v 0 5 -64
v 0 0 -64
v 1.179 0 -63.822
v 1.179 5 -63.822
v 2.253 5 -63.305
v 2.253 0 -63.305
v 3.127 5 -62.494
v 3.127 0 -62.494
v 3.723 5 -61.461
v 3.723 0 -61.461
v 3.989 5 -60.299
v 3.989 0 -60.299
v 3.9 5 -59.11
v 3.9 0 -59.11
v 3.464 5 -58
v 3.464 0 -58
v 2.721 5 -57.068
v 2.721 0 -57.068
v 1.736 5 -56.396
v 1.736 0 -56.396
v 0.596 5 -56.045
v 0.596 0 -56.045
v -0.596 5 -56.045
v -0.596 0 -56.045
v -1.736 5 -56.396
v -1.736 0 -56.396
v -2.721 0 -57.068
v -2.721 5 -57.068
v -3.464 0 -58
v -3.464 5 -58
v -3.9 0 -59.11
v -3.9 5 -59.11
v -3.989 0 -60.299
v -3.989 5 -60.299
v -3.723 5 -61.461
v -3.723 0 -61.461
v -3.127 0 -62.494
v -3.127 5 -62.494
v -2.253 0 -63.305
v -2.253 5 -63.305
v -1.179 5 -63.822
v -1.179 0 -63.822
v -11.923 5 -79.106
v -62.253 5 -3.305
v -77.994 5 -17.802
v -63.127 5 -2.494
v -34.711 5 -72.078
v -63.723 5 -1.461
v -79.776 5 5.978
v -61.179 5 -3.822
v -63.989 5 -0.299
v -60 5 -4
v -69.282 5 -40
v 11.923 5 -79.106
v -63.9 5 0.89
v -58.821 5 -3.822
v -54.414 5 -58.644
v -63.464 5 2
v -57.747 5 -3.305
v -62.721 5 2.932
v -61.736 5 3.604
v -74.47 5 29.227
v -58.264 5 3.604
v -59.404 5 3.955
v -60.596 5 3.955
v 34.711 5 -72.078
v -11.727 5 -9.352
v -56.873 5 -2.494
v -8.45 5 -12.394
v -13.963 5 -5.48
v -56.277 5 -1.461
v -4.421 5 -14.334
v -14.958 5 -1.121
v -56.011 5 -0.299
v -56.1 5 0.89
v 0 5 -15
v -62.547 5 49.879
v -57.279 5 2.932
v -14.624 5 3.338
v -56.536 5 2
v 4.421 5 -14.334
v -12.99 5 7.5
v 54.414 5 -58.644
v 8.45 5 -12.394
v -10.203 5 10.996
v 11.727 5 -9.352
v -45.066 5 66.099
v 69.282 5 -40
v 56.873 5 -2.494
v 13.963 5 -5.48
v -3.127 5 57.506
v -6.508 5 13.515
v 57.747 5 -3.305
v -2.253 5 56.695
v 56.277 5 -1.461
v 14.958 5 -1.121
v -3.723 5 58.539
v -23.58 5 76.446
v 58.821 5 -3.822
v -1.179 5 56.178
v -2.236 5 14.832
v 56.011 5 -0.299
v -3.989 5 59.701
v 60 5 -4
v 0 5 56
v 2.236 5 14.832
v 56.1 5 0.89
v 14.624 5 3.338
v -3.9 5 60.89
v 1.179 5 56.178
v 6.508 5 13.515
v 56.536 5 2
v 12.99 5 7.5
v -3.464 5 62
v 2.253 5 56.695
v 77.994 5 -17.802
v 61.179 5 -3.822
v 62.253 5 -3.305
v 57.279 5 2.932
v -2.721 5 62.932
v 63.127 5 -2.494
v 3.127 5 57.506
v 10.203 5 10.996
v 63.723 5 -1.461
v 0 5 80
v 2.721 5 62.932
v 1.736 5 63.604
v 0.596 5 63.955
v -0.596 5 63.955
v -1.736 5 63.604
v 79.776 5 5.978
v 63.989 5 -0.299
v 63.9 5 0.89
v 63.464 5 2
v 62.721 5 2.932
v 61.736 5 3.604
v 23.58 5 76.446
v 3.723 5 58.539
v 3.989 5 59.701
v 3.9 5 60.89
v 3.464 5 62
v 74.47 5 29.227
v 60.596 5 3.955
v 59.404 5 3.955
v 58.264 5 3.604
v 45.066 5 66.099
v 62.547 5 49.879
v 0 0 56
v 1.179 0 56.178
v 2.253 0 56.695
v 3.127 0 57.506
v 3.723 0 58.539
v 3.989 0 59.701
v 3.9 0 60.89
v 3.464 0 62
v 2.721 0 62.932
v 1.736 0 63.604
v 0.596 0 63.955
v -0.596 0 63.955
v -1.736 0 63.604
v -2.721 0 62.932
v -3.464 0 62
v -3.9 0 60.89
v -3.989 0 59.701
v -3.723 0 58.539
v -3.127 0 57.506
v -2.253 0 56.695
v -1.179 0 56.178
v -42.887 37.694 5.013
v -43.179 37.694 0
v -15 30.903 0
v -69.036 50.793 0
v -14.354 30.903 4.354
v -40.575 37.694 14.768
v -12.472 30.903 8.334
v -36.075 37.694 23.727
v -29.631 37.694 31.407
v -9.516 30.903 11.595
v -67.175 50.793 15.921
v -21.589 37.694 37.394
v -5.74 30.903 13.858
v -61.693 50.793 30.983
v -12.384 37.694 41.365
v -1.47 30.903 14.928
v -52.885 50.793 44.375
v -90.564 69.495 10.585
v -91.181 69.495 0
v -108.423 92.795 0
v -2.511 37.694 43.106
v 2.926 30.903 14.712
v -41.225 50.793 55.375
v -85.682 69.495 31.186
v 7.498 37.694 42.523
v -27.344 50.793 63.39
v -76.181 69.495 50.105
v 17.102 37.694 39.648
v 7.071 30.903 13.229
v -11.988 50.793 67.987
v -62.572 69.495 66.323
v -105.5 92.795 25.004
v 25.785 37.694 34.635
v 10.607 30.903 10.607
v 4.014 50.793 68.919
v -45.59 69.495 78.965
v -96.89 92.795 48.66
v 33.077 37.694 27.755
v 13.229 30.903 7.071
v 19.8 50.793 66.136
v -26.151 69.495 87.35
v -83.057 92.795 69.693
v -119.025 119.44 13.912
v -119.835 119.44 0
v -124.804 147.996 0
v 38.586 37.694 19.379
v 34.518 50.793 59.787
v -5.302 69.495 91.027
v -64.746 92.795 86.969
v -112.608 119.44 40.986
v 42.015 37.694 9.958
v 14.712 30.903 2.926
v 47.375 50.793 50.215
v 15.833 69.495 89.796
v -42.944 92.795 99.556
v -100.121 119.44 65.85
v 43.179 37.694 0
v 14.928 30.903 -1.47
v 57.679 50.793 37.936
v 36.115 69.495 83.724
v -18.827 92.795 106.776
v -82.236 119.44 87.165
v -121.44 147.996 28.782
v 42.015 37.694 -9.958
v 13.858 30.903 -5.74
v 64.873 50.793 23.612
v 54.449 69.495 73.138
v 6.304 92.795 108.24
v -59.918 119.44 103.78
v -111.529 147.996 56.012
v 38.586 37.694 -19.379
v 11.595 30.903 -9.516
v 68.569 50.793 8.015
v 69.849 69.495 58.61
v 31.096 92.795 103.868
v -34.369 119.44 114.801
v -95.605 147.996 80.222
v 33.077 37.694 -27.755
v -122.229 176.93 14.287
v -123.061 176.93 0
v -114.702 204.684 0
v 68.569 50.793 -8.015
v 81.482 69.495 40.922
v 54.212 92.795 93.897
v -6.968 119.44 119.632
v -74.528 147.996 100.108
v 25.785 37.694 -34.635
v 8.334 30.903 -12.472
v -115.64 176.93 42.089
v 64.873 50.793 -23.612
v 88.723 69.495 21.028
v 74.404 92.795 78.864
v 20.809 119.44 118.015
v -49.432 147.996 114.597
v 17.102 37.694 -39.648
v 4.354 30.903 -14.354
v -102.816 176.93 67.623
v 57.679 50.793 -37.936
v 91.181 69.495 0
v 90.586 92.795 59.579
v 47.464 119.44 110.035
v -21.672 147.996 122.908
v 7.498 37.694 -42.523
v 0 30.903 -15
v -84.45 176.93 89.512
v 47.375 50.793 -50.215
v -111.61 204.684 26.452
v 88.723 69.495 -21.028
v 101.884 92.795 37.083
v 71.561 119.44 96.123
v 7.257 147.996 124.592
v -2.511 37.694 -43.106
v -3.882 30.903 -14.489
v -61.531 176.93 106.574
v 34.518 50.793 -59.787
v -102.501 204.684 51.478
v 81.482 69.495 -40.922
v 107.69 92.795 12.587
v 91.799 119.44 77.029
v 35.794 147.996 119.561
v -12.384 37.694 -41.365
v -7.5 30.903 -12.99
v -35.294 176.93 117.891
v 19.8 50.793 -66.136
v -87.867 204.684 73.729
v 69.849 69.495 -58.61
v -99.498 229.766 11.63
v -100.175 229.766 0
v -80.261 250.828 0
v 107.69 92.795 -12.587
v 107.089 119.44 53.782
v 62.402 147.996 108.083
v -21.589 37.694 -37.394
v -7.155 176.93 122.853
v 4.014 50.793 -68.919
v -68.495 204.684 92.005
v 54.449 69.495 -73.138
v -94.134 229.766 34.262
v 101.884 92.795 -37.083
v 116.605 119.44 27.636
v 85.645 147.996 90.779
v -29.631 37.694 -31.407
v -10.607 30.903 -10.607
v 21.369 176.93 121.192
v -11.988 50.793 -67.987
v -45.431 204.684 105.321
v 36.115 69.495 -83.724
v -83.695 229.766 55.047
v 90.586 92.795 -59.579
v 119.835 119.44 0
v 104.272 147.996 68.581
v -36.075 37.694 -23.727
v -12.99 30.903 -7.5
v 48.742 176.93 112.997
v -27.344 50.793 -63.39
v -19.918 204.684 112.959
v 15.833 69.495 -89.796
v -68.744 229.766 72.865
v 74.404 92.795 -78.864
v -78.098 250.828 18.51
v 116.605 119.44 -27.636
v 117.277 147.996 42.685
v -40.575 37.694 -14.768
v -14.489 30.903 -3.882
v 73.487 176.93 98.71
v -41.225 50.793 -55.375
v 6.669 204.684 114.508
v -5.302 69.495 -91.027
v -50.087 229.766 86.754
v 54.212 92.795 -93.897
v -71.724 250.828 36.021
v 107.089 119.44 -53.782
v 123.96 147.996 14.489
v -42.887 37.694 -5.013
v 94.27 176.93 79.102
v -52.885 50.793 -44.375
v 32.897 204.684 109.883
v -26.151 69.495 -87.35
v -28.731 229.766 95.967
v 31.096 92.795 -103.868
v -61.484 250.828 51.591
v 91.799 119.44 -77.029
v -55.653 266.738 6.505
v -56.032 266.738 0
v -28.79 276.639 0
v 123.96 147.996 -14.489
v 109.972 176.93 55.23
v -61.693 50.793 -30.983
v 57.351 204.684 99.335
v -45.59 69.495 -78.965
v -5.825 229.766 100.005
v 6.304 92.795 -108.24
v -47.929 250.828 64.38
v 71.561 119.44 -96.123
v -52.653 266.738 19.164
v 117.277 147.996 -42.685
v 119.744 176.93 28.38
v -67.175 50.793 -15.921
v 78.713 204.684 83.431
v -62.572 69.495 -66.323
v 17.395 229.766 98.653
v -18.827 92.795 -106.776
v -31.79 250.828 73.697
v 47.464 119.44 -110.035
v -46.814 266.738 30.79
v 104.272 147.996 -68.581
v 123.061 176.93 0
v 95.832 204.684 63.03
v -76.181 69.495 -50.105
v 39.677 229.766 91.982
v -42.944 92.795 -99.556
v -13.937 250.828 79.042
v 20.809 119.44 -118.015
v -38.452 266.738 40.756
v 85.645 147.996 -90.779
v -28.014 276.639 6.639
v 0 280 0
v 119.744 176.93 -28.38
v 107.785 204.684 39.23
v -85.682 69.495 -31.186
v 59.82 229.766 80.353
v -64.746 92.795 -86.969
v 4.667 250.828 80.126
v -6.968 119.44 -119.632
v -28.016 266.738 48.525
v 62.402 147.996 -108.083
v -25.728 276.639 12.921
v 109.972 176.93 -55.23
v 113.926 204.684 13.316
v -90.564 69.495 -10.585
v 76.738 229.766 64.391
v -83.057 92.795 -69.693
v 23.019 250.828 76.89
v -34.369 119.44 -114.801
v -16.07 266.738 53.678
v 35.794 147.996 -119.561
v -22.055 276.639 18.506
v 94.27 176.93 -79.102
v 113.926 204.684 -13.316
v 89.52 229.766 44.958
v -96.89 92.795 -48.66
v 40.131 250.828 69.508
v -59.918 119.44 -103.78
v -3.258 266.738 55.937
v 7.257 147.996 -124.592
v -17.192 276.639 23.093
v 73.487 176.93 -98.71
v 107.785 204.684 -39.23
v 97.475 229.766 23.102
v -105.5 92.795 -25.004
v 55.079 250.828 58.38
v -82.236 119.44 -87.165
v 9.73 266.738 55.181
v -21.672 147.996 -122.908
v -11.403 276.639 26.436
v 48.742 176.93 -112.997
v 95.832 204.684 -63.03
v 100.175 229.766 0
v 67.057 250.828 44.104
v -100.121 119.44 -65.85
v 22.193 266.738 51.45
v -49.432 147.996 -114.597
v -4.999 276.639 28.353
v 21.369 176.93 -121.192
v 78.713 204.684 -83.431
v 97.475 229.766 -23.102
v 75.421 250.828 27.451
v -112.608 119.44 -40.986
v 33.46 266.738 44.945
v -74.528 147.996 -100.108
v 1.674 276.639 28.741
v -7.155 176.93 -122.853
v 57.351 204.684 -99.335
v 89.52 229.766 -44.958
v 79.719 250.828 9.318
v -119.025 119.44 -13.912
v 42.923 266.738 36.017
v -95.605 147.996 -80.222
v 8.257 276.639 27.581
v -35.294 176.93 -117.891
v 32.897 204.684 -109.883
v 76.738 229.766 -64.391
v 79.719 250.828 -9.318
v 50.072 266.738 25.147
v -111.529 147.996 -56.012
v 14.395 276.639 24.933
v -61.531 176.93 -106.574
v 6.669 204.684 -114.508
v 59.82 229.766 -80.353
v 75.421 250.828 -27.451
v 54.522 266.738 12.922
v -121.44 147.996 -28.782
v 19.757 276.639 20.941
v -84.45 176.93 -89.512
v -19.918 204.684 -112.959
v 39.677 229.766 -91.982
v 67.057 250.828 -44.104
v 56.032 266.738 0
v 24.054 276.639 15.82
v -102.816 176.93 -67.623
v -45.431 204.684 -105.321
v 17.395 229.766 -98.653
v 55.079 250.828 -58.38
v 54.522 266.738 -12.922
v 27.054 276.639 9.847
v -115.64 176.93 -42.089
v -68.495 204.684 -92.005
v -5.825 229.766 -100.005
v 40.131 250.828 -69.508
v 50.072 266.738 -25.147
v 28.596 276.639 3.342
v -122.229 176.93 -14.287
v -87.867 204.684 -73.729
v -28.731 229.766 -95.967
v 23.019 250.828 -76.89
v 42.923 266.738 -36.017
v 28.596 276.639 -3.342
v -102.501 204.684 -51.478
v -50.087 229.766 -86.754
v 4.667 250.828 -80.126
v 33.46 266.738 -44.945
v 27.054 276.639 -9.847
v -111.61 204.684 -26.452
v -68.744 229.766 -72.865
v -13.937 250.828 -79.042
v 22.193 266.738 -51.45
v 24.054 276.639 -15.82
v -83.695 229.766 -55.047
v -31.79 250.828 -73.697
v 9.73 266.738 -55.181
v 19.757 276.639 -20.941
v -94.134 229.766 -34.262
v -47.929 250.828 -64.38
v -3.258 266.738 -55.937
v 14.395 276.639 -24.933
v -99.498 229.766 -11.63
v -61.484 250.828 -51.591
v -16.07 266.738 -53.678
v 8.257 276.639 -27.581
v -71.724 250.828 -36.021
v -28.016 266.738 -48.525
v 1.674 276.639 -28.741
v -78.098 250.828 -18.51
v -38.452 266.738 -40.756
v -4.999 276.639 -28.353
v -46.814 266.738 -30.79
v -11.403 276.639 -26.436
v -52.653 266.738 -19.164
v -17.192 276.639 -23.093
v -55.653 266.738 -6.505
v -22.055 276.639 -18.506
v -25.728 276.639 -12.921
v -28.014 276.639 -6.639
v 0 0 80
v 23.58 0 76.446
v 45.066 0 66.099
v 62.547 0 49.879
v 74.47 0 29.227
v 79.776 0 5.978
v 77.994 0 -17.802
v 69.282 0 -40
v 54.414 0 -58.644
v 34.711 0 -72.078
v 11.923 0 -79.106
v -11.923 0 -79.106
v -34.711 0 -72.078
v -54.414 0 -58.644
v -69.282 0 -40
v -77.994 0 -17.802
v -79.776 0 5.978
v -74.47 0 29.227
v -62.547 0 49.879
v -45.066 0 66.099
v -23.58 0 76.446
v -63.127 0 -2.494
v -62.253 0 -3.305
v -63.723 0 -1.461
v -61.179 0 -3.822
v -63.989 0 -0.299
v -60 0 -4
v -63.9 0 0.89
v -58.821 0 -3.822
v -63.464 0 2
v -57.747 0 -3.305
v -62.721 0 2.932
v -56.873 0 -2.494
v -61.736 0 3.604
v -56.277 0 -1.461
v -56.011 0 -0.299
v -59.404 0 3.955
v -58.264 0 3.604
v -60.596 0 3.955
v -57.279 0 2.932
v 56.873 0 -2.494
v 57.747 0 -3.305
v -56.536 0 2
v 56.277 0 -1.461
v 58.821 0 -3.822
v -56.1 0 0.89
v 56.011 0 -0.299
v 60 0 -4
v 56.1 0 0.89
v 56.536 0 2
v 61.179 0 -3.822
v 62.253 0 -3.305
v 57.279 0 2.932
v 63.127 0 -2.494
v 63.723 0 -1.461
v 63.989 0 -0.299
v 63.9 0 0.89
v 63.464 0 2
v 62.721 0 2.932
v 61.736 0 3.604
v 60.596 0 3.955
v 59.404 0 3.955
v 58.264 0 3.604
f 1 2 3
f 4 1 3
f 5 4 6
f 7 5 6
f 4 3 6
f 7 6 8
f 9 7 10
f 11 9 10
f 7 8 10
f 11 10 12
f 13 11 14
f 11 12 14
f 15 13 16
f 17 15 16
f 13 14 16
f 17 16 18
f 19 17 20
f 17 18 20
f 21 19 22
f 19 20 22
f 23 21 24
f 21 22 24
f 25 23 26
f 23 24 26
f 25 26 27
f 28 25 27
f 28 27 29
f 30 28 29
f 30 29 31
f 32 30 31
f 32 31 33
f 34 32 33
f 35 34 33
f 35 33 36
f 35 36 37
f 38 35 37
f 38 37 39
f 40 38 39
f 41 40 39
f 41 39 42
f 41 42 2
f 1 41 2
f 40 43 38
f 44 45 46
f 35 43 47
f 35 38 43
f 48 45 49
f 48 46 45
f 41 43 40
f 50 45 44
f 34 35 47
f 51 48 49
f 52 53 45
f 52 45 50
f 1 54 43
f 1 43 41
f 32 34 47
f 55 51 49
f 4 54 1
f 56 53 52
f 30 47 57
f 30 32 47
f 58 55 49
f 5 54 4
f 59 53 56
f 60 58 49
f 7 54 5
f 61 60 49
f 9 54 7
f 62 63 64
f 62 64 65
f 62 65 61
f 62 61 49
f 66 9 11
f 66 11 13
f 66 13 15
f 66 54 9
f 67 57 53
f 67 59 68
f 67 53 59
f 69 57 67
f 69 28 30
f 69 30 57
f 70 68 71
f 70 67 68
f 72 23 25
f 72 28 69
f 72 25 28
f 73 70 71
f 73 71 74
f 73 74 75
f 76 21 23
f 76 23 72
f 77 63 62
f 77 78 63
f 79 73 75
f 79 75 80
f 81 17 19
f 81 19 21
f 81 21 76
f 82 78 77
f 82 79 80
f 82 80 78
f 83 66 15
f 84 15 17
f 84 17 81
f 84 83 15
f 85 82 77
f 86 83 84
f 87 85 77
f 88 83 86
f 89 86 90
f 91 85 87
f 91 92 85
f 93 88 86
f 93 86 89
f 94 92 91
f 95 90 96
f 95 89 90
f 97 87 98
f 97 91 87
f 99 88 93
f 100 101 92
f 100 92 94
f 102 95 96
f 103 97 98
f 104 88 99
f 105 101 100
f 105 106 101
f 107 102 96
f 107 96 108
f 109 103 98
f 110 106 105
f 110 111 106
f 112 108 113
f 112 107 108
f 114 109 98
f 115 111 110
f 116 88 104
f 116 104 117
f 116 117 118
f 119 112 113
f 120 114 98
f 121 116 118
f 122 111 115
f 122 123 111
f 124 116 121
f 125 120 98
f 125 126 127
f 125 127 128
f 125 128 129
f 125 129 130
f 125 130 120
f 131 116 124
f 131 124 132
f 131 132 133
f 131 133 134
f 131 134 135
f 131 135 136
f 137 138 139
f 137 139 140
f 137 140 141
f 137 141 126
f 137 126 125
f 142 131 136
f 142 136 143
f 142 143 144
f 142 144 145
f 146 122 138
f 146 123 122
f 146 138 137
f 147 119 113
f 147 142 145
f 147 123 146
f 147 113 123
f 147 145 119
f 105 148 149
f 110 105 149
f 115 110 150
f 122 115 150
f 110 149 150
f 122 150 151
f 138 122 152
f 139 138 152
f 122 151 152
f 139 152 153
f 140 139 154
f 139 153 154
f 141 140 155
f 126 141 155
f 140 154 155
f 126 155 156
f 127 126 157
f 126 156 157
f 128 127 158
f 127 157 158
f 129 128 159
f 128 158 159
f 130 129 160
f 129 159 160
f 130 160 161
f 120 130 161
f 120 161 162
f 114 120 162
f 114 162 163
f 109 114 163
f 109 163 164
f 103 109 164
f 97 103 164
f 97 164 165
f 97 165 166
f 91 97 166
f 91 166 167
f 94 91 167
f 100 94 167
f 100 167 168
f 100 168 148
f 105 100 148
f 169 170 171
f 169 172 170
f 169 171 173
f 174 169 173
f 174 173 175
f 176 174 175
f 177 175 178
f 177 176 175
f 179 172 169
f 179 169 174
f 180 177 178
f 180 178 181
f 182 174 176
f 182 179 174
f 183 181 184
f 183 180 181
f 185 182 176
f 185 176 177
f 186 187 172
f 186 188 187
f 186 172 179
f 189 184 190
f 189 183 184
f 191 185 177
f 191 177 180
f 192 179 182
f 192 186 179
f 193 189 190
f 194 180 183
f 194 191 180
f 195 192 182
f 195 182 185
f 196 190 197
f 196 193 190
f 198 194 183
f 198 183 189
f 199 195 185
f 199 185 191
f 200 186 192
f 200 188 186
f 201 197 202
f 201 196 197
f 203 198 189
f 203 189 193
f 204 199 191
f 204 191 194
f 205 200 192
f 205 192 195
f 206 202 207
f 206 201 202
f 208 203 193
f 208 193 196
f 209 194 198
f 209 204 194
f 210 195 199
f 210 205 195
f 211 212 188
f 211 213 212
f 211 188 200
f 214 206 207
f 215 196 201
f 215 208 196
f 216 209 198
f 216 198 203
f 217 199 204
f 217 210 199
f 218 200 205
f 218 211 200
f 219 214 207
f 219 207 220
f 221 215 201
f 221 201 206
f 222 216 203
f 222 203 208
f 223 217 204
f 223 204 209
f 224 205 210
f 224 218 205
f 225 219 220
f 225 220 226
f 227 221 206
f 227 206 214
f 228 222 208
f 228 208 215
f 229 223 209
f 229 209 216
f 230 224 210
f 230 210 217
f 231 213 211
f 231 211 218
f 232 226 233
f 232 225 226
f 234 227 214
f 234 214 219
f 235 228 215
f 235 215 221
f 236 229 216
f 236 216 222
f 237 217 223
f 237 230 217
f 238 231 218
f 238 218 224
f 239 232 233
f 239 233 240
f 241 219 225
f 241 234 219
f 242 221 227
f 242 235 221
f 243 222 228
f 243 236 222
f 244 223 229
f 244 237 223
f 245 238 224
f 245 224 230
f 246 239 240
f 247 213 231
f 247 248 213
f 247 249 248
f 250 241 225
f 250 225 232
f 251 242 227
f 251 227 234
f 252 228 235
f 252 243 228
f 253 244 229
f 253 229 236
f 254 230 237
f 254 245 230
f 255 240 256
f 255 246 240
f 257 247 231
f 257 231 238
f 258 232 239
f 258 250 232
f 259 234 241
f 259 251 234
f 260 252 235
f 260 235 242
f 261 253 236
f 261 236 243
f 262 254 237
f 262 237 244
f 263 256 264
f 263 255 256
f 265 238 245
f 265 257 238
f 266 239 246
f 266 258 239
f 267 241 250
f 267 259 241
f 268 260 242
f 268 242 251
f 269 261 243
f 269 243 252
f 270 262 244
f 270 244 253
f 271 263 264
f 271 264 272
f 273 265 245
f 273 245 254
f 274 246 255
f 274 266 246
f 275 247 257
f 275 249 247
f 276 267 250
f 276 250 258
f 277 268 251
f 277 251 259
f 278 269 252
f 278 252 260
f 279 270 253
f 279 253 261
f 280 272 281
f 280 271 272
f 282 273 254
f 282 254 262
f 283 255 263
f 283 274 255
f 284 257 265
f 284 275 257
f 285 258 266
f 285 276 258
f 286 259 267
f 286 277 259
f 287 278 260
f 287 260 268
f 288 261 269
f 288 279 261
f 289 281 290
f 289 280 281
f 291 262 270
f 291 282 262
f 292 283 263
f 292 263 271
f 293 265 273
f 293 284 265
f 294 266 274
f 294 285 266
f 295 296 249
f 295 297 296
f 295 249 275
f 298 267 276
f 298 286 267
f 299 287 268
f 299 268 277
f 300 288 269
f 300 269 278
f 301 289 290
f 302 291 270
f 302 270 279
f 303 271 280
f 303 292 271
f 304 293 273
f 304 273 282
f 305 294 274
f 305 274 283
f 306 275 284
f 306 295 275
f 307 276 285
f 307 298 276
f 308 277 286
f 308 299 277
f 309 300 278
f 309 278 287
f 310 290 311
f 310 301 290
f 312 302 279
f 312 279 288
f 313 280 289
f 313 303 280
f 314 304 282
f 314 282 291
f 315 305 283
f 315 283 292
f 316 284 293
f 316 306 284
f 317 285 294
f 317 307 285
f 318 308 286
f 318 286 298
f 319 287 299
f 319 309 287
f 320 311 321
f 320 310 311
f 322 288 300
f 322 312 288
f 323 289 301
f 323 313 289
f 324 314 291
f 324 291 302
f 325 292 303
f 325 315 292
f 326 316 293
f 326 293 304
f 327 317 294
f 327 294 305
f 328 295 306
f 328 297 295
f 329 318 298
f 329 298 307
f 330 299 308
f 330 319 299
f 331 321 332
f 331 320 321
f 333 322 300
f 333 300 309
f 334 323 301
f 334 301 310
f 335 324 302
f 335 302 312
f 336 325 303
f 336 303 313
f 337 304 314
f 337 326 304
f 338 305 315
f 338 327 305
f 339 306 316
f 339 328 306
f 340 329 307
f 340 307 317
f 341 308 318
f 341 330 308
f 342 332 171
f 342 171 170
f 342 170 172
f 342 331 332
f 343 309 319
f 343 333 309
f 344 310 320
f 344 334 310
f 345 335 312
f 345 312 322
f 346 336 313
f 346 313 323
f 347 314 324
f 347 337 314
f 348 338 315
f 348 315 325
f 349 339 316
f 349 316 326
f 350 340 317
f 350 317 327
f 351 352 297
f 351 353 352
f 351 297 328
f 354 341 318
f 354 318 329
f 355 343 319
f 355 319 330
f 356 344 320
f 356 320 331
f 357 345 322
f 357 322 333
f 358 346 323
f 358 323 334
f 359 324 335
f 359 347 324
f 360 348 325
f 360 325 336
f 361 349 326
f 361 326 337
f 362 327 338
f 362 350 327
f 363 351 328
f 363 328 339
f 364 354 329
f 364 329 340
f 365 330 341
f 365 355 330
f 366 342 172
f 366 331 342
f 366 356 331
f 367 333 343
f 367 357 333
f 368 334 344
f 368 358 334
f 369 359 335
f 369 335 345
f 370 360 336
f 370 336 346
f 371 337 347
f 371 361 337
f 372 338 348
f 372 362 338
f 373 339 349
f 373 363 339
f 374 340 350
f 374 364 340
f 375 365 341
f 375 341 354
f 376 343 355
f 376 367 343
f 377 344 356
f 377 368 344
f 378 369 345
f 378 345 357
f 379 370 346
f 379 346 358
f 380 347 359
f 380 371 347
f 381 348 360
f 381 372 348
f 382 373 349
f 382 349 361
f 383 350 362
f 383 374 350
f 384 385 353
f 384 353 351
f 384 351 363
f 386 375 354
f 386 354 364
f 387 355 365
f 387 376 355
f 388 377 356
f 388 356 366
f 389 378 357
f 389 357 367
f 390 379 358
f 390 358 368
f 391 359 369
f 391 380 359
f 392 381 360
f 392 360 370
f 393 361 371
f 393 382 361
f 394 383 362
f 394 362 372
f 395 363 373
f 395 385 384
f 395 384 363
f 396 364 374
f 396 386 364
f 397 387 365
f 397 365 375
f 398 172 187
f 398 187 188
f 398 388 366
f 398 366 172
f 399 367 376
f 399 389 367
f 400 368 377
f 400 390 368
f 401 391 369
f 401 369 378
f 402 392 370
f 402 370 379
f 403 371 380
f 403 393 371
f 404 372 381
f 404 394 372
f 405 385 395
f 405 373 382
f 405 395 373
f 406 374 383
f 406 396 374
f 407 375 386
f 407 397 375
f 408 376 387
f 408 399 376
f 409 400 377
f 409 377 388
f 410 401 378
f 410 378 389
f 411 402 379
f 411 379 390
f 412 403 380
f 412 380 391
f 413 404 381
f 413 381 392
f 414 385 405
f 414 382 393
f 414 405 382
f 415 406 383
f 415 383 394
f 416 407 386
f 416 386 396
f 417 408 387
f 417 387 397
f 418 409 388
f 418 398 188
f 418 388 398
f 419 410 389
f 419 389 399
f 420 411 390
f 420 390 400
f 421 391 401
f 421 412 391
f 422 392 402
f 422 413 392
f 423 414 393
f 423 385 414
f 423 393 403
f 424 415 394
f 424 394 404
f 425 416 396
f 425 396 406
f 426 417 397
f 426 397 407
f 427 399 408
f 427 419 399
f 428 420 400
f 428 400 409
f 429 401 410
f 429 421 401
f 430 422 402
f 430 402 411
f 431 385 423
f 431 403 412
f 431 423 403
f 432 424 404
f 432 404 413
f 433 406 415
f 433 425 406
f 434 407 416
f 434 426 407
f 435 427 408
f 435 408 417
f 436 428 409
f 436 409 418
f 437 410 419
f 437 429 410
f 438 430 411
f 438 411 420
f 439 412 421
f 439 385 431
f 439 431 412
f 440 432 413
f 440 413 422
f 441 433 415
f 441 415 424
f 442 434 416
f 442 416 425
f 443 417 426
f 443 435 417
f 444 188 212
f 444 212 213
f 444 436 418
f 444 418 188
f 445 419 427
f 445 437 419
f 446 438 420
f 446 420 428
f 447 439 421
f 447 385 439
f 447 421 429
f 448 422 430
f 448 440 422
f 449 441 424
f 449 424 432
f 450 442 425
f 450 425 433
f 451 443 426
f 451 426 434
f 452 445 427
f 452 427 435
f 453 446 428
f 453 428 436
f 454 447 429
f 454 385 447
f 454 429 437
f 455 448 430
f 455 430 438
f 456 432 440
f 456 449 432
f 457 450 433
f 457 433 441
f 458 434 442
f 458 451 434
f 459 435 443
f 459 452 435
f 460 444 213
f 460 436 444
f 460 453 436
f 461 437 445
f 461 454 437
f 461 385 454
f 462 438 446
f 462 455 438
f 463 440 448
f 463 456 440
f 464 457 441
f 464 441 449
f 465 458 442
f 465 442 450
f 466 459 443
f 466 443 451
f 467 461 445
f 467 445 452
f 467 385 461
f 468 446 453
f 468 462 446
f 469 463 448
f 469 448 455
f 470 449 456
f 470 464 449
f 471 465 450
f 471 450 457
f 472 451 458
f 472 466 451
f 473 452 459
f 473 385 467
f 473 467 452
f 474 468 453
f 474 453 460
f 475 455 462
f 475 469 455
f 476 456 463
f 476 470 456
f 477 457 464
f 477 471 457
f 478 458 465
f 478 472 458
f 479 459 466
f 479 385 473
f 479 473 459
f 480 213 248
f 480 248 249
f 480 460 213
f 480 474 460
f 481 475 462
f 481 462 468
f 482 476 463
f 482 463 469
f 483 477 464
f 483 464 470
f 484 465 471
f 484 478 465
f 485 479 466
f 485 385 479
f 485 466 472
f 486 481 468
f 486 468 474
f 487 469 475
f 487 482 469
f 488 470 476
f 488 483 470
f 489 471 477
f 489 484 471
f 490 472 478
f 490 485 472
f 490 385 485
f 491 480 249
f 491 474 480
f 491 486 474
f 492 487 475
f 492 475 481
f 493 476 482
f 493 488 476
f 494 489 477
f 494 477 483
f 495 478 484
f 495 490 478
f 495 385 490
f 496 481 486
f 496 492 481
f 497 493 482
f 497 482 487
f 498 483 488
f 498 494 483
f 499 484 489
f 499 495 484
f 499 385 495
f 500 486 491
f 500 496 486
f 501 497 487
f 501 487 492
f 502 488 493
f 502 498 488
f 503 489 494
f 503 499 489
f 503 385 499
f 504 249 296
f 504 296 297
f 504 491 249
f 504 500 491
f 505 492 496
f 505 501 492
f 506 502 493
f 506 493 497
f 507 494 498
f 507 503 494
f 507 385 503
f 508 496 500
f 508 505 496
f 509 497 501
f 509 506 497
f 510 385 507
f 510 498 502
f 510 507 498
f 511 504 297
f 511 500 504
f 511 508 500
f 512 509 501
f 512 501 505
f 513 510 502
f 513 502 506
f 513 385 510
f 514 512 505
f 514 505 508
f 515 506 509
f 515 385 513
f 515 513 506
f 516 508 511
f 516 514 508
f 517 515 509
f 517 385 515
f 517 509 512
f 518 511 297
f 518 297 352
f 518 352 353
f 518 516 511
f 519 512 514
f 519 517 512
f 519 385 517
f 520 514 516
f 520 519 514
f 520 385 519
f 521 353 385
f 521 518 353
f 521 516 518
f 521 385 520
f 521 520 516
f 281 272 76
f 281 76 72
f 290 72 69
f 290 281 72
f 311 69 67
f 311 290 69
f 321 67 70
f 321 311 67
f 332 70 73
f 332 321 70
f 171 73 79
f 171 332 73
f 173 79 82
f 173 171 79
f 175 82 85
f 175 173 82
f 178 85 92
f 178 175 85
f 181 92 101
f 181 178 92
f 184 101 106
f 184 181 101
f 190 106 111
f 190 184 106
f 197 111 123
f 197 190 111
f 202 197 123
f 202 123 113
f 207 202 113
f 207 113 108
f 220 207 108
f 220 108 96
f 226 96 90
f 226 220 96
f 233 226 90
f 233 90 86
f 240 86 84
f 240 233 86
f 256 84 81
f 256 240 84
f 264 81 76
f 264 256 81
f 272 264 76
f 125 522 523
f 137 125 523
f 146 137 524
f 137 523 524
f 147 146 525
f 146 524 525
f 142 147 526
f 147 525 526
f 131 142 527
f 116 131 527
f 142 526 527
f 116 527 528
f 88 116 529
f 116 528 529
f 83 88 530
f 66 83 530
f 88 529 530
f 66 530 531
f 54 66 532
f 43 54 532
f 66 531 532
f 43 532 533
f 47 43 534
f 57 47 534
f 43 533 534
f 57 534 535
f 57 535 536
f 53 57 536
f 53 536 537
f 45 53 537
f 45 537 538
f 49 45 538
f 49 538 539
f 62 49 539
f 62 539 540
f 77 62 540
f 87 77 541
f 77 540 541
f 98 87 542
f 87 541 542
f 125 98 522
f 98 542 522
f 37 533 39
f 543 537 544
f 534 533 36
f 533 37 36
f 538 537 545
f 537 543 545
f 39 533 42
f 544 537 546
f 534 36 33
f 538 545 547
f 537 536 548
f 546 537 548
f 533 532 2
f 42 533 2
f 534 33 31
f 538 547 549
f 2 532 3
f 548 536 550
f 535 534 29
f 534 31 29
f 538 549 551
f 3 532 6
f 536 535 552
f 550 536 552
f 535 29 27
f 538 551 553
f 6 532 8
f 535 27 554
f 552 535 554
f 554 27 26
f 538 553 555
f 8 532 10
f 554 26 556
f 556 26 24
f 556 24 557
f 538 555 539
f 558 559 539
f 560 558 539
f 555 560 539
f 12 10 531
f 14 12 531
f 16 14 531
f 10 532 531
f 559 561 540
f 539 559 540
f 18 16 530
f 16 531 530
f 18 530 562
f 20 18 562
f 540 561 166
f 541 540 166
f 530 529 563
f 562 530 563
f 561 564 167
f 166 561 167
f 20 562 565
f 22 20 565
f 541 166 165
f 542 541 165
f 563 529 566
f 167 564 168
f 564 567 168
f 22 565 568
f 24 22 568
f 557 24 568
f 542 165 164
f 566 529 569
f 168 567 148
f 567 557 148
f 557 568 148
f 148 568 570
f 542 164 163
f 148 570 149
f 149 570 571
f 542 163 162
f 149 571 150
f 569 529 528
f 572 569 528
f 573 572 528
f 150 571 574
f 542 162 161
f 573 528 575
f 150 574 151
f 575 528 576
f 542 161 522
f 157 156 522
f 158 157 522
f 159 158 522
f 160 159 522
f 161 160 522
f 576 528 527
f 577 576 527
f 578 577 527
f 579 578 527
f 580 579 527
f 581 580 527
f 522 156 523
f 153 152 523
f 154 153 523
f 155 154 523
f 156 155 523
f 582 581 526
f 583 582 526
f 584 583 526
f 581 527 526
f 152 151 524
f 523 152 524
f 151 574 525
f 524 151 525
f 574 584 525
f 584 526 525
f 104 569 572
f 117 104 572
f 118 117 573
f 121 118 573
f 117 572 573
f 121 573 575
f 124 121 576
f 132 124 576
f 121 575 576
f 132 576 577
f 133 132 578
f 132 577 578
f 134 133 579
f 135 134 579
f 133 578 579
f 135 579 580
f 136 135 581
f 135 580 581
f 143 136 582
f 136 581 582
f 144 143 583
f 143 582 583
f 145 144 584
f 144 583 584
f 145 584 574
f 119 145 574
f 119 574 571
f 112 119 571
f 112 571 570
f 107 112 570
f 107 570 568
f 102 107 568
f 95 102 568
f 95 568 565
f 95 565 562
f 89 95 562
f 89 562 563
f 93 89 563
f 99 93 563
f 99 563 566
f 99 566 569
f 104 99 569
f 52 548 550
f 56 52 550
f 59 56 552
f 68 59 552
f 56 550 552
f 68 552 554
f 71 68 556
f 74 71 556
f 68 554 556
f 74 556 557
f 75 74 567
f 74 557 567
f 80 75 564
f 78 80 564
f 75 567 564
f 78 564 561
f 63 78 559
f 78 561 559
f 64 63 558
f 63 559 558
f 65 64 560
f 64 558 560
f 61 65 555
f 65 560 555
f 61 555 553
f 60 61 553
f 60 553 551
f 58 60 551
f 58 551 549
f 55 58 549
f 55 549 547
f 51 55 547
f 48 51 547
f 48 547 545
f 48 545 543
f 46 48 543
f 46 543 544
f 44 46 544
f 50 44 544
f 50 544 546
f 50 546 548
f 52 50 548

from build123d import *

# Parameters (mm, degrees)
SKETCH_1_R      = 80
EXTRUDE_1_DEPTH = 5
MM_1_D          = 8
MM_1_DEPTH      = 20
MM_1_TIP        = 2.403442476
SKETCH_4_W      = 15
SKETCH_4_H      = 30


with BuildPart() as part:
    # 草图1 → 凸台-拉伸1 (new body)
    with BuildSketch(Plane(origin=(0, 0, 0), x_dir=(1, 0, 0), z_dir=(0, 1, 0))):
        with Locations(Location((0, 0, 0), (0, 0, 270))):
            Circle(SKETCH_1_R)
    extrude(amount=EXTRUDE_1_DEPTH)

    # 大小mm 暗销孔1
    with Locations(Plane(origin=(0, 5, -60), x_dir=(0, 0, 1), z_dir=(0, 1, 0))):
        with Locations((0, 0), (60, -60), (60, 60), (120, 0)):
            Hole(MM_1_D / 2, depth=MM_1_DEPTH)
            with Locations((0, 0, -(MM_1_DEPTH + MM_1_TIP / 2))):  # 118° drill point
                Cone(0, MM_1_D / 2, MM_1_TIP, mode=Mode.SUBTRACT)

    # 草图4 → 旋转1 (revolve)
    with BuildSketch(Plane.XY, mode=Mode.PRIVATE) as revolve_1_sk:
        with Locations((7.5, 20)):
            Rectangle(SKETCH_4_W, SKETCH_4_H)
    revolve(revolve_1_sk.sketch.rotate(Axis((0, 5, 0), (0, 1, 0)), 90), axis=Axis((0, 5, 0), (0, 1, 0)))

    # 草图5 → 旋转2 (revolve)
    with BuildSketch(Plane.XY):
        with BuildLine():
            Line((0, 35), (0, 30))
            ThreePointArc((0, 30), (-125, 155), (0, 280))
            Line((0, 280), (0, 35))
        make_face()
    revolve(axis=Axis((0, 35, 0), (0, 1, 0)))


solid = part.part
